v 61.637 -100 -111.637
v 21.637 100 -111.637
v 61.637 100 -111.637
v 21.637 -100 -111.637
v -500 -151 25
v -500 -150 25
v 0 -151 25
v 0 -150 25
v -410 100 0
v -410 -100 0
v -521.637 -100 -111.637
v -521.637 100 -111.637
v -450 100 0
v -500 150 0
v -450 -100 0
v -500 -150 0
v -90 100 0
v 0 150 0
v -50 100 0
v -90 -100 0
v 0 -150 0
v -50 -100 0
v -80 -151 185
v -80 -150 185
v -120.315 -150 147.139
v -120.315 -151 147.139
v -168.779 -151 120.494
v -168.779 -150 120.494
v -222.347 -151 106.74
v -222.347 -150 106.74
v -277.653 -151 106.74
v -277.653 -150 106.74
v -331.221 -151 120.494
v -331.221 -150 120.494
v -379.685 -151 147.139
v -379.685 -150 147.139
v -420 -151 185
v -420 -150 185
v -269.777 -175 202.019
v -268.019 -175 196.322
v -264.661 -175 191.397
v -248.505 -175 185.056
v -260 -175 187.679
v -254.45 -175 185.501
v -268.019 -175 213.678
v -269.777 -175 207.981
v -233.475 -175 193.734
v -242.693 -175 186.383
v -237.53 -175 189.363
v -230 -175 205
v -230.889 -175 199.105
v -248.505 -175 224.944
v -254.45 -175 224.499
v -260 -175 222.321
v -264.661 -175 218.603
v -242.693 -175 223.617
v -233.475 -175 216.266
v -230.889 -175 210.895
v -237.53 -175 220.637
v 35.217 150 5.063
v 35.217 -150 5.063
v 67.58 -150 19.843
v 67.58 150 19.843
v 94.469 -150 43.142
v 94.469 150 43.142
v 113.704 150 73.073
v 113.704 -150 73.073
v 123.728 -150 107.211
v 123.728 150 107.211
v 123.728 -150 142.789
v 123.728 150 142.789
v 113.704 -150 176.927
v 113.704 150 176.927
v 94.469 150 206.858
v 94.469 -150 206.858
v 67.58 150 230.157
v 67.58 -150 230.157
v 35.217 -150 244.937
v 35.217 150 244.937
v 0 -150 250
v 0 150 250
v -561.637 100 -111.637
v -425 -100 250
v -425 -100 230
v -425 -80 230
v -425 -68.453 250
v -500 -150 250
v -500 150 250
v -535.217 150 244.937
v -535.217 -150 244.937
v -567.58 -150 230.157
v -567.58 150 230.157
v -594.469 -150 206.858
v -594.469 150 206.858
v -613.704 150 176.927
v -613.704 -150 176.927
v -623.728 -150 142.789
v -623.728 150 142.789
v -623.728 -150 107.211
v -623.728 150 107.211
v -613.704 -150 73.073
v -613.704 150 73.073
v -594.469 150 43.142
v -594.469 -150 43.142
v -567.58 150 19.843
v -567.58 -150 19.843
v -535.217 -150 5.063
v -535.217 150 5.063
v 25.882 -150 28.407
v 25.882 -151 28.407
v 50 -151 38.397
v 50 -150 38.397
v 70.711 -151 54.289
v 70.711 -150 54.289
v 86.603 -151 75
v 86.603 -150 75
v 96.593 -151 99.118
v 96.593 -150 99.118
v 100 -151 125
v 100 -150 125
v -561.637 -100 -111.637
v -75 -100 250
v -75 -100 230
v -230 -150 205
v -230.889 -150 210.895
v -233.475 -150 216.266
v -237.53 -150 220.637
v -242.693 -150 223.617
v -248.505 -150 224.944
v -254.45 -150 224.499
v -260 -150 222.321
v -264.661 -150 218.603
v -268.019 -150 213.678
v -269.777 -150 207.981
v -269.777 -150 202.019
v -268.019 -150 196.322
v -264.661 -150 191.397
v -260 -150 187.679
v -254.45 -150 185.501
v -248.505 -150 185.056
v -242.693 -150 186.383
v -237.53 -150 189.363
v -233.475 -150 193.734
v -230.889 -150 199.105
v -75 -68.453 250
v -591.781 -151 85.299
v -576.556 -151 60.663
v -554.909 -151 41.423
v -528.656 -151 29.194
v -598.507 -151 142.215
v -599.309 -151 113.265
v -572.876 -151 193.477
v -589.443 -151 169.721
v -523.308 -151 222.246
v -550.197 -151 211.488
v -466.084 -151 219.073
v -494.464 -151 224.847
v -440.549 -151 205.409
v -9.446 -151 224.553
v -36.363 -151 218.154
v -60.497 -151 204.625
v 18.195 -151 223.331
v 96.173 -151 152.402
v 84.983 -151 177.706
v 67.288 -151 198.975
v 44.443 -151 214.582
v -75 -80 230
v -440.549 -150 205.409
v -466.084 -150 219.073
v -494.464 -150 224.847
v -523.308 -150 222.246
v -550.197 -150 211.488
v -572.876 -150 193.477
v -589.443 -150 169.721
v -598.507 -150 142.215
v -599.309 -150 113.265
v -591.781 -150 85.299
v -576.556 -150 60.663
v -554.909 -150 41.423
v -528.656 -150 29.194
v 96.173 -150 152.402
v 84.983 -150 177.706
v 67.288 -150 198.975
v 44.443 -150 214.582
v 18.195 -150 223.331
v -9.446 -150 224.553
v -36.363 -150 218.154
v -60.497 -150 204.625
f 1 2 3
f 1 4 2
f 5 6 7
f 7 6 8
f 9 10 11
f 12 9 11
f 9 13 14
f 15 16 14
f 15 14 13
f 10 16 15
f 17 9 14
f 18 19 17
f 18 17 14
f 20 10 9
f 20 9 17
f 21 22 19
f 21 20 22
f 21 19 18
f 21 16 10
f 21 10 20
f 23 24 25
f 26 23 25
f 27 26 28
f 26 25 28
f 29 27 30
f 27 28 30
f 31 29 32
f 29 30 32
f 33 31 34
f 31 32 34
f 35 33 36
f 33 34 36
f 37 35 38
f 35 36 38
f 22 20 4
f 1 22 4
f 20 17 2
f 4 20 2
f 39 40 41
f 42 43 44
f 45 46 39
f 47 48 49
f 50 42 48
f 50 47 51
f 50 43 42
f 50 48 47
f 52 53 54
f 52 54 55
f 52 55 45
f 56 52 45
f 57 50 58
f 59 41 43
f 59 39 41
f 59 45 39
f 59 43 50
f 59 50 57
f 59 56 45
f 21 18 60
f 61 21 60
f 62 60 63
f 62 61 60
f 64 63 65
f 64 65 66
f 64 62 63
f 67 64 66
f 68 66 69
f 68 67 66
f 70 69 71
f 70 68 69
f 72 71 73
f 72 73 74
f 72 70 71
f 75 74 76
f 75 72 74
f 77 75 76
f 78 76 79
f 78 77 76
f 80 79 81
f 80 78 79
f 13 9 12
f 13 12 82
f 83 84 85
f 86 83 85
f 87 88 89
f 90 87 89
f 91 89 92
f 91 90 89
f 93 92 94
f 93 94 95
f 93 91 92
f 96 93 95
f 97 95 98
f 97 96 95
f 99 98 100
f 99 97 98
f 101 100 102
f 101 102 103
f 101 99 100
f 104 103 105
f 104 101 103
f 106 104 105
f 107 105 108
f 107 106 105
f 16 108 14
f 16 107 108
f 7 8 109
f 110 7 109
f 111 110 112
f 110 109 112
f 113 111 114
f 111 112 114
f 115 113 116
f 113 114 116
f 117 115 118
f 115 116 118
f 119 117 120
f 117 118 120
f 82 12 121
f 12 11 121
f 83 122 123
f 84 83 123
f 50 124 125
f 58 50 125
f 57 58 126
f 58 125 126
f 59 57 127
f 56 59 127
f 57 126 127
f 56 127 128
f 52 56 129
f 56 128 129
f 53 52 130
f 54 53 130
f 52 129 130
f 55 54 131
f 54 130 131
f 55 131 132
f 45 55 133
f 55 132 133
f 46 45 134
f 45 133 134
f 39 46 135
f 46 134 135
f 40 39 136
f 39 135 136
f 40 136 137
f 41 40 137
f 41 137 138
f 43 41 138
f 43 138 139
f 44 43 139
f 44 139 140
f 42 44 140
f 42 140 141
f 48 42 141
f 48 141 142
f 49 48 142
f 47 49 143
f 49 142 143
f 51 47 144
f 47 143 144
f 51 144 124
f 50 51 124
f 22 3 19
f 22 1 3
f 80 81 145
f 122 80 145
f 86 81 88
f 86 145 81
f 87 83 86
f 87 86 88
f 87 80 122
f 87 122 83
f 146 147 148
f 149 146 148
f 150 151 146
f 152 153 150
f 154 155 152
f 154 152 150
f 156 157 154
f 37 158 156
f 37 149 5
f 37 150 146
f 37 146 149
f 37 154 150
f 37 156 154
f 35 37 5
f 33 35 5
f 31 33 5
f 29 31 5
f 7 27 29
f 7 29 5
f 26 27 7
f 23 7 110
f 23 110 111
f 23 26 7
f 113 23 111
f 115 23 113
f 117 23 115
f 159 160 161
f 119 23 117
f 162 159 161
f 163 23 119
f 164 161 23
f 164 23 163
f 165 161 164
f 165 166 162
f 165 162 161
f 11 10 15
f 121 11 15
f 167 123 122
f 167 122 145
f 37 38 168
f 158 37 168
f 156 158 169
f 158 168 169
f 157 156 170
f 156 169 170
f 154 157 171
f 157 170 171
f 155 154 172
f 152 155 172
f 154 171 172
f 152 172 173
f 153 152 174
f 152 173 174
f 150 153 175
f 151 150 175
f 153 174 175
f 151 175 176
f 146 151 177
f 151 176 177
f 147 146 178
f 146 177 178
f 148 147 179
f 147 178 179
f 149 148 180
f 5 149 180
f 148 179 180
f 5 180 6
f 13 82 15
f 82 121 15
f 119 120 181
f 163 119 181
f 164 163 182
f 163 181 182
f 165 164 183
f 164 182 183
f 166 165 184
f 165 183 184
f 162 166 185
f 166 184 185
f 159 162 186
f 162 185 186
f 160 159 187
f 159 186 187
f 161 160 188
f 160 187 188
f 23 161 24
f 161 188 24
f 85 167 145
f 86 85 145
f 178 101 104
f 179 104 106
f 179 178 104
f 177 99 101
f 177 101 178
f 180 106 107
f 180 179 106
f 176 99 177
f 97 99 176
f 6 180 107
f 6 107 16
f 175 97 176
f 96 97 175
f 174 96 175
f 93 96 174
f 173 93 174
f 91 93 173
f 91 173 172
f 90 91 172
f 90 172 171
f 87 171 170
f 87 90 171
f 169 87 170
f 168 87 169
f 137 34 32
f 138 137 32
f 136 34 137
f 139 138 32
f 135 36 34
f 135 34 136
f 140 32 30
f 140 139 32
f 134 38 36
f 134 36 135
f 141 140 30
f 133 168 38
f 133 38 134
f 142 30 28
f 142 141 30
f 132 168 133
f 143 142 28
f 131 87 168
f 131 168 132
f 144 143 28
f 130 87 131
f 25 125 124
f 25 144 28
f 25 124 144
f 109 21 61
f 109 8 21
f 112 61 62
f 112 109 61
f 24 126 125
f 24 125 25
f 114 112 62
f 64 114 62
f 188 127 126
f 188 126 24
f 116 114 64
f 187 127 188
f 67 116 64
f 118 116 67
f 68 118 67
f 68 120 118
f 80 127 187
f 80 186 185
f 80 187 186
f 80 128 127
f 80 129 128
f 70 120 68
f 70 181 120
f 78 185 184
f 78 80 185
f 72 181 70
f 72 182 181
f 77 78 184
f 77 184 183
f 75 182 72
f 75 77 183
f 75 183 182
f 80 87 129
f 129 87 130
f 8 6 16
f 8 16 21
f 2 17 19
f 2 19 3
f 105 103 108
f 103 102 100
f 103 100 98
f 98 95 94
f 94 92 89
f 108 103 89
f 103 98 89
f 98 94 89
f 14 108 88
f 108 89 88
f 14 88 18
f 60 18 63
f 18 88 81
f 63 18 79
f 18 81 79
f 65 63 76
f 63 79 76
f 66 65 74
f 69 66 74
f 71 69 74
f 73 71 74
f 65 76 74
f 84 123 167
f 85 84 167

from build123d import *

# Parameters (mm, degrees)
F1_DEPTH  = 150
F3_DEPTH  = 100
F7_DEPTH  = 1
F8_R      = 20
F9_DEPTH  = 25
F11_DEPTH = 175


with BuildPart() as f1:
    # F0 (on Front) → F1 (new body, symmetric)
    with BuildSketch(Plane.XZ):
        with BuildLine():
            Line((-500, 0), (0, 0))
            ThreePointArc((0, 0), (125, 125), (0, 250))
            Line((0, 250), (-500, 250))
            ThreePointArc((-500, 250), (-625, 125), (-500, 0))
        make_face()
    extrude(amount=F1_DEPTH, both=True)

    # F2 (on Front) → F3 (join, symmetric)
    with BuildSketch(Plane.XZ):
        Polygon((61.636794, -111.636794), (-50, 0), (-90, 0), (21.636792, -111.636794), align=None)
    extrude(amount=F3_DEPTH, both=True)

    # F5: F1 across plane


with BuildPart() as f1_1:
    add(f1.part)
    add(f1.part.mirror(Plane.YZ.offset(-250)))

    # F6 (on face) → F7 (join)
    with BuildSketch(Plane.XZ.offset(150)):
        with BuildLine():
            ThreePointArc((-500, 25), (-429.289322, 54.289322), (-400, 125))
            ThreePointArc((-400, 125), (-405.13167, 156.622777), (-420, 185))
            ThreePointArc((-420, 185), (-589.442719, 169.72136), (-500, 25))
        make_face()
        with BuildLine():
            ThreePointArc((-420, 185), (-405.13167, 156.622777), (-400, 125))
            ThreePointArc((-400, 125), (-429.289322, 54.289322), (-500, 25))
            Line((-500, 25), (0, 25))
            ThreePointArc((0, 25), (-89.442719, 80.27864), (-80, 185))
            ThreePointArc((-80, 185), (-250, 105), (-420, 185))
        make_face()
        with BuildLine():
            ThreePointArc((100, 125), (31.622777, 219.86833), (-80, 185))
            ThreePointArc((-80, 185), (-89.442719, 80.27864), (0, 25))
            ThreePointArc((0, 25), (70.710678, 54.289322), (100, 125))
        make_face()
    extrude(amount=F7_DEPTH)

    # F8 (on face) → F9 (join)
    with BuildSketch(Plane.XZ.offset(150)):
        with Locations((-250, 205)):
            Circle(F8_R)
    extrude(amount=F9_DEPTH)

    # F10 (on offset) → F11 (cut, symmetric)
    with BuildSketch(Plane.YZ.offset(-250)):
        Polygon((-68, 250.78461), (-100, 250.78461), (-100, 230), (-80, 230), align=None)
    extrude(amount=F11_DEPTH, both=True, mode=Mode.SUBTRACT)


solid = f1_1.part
